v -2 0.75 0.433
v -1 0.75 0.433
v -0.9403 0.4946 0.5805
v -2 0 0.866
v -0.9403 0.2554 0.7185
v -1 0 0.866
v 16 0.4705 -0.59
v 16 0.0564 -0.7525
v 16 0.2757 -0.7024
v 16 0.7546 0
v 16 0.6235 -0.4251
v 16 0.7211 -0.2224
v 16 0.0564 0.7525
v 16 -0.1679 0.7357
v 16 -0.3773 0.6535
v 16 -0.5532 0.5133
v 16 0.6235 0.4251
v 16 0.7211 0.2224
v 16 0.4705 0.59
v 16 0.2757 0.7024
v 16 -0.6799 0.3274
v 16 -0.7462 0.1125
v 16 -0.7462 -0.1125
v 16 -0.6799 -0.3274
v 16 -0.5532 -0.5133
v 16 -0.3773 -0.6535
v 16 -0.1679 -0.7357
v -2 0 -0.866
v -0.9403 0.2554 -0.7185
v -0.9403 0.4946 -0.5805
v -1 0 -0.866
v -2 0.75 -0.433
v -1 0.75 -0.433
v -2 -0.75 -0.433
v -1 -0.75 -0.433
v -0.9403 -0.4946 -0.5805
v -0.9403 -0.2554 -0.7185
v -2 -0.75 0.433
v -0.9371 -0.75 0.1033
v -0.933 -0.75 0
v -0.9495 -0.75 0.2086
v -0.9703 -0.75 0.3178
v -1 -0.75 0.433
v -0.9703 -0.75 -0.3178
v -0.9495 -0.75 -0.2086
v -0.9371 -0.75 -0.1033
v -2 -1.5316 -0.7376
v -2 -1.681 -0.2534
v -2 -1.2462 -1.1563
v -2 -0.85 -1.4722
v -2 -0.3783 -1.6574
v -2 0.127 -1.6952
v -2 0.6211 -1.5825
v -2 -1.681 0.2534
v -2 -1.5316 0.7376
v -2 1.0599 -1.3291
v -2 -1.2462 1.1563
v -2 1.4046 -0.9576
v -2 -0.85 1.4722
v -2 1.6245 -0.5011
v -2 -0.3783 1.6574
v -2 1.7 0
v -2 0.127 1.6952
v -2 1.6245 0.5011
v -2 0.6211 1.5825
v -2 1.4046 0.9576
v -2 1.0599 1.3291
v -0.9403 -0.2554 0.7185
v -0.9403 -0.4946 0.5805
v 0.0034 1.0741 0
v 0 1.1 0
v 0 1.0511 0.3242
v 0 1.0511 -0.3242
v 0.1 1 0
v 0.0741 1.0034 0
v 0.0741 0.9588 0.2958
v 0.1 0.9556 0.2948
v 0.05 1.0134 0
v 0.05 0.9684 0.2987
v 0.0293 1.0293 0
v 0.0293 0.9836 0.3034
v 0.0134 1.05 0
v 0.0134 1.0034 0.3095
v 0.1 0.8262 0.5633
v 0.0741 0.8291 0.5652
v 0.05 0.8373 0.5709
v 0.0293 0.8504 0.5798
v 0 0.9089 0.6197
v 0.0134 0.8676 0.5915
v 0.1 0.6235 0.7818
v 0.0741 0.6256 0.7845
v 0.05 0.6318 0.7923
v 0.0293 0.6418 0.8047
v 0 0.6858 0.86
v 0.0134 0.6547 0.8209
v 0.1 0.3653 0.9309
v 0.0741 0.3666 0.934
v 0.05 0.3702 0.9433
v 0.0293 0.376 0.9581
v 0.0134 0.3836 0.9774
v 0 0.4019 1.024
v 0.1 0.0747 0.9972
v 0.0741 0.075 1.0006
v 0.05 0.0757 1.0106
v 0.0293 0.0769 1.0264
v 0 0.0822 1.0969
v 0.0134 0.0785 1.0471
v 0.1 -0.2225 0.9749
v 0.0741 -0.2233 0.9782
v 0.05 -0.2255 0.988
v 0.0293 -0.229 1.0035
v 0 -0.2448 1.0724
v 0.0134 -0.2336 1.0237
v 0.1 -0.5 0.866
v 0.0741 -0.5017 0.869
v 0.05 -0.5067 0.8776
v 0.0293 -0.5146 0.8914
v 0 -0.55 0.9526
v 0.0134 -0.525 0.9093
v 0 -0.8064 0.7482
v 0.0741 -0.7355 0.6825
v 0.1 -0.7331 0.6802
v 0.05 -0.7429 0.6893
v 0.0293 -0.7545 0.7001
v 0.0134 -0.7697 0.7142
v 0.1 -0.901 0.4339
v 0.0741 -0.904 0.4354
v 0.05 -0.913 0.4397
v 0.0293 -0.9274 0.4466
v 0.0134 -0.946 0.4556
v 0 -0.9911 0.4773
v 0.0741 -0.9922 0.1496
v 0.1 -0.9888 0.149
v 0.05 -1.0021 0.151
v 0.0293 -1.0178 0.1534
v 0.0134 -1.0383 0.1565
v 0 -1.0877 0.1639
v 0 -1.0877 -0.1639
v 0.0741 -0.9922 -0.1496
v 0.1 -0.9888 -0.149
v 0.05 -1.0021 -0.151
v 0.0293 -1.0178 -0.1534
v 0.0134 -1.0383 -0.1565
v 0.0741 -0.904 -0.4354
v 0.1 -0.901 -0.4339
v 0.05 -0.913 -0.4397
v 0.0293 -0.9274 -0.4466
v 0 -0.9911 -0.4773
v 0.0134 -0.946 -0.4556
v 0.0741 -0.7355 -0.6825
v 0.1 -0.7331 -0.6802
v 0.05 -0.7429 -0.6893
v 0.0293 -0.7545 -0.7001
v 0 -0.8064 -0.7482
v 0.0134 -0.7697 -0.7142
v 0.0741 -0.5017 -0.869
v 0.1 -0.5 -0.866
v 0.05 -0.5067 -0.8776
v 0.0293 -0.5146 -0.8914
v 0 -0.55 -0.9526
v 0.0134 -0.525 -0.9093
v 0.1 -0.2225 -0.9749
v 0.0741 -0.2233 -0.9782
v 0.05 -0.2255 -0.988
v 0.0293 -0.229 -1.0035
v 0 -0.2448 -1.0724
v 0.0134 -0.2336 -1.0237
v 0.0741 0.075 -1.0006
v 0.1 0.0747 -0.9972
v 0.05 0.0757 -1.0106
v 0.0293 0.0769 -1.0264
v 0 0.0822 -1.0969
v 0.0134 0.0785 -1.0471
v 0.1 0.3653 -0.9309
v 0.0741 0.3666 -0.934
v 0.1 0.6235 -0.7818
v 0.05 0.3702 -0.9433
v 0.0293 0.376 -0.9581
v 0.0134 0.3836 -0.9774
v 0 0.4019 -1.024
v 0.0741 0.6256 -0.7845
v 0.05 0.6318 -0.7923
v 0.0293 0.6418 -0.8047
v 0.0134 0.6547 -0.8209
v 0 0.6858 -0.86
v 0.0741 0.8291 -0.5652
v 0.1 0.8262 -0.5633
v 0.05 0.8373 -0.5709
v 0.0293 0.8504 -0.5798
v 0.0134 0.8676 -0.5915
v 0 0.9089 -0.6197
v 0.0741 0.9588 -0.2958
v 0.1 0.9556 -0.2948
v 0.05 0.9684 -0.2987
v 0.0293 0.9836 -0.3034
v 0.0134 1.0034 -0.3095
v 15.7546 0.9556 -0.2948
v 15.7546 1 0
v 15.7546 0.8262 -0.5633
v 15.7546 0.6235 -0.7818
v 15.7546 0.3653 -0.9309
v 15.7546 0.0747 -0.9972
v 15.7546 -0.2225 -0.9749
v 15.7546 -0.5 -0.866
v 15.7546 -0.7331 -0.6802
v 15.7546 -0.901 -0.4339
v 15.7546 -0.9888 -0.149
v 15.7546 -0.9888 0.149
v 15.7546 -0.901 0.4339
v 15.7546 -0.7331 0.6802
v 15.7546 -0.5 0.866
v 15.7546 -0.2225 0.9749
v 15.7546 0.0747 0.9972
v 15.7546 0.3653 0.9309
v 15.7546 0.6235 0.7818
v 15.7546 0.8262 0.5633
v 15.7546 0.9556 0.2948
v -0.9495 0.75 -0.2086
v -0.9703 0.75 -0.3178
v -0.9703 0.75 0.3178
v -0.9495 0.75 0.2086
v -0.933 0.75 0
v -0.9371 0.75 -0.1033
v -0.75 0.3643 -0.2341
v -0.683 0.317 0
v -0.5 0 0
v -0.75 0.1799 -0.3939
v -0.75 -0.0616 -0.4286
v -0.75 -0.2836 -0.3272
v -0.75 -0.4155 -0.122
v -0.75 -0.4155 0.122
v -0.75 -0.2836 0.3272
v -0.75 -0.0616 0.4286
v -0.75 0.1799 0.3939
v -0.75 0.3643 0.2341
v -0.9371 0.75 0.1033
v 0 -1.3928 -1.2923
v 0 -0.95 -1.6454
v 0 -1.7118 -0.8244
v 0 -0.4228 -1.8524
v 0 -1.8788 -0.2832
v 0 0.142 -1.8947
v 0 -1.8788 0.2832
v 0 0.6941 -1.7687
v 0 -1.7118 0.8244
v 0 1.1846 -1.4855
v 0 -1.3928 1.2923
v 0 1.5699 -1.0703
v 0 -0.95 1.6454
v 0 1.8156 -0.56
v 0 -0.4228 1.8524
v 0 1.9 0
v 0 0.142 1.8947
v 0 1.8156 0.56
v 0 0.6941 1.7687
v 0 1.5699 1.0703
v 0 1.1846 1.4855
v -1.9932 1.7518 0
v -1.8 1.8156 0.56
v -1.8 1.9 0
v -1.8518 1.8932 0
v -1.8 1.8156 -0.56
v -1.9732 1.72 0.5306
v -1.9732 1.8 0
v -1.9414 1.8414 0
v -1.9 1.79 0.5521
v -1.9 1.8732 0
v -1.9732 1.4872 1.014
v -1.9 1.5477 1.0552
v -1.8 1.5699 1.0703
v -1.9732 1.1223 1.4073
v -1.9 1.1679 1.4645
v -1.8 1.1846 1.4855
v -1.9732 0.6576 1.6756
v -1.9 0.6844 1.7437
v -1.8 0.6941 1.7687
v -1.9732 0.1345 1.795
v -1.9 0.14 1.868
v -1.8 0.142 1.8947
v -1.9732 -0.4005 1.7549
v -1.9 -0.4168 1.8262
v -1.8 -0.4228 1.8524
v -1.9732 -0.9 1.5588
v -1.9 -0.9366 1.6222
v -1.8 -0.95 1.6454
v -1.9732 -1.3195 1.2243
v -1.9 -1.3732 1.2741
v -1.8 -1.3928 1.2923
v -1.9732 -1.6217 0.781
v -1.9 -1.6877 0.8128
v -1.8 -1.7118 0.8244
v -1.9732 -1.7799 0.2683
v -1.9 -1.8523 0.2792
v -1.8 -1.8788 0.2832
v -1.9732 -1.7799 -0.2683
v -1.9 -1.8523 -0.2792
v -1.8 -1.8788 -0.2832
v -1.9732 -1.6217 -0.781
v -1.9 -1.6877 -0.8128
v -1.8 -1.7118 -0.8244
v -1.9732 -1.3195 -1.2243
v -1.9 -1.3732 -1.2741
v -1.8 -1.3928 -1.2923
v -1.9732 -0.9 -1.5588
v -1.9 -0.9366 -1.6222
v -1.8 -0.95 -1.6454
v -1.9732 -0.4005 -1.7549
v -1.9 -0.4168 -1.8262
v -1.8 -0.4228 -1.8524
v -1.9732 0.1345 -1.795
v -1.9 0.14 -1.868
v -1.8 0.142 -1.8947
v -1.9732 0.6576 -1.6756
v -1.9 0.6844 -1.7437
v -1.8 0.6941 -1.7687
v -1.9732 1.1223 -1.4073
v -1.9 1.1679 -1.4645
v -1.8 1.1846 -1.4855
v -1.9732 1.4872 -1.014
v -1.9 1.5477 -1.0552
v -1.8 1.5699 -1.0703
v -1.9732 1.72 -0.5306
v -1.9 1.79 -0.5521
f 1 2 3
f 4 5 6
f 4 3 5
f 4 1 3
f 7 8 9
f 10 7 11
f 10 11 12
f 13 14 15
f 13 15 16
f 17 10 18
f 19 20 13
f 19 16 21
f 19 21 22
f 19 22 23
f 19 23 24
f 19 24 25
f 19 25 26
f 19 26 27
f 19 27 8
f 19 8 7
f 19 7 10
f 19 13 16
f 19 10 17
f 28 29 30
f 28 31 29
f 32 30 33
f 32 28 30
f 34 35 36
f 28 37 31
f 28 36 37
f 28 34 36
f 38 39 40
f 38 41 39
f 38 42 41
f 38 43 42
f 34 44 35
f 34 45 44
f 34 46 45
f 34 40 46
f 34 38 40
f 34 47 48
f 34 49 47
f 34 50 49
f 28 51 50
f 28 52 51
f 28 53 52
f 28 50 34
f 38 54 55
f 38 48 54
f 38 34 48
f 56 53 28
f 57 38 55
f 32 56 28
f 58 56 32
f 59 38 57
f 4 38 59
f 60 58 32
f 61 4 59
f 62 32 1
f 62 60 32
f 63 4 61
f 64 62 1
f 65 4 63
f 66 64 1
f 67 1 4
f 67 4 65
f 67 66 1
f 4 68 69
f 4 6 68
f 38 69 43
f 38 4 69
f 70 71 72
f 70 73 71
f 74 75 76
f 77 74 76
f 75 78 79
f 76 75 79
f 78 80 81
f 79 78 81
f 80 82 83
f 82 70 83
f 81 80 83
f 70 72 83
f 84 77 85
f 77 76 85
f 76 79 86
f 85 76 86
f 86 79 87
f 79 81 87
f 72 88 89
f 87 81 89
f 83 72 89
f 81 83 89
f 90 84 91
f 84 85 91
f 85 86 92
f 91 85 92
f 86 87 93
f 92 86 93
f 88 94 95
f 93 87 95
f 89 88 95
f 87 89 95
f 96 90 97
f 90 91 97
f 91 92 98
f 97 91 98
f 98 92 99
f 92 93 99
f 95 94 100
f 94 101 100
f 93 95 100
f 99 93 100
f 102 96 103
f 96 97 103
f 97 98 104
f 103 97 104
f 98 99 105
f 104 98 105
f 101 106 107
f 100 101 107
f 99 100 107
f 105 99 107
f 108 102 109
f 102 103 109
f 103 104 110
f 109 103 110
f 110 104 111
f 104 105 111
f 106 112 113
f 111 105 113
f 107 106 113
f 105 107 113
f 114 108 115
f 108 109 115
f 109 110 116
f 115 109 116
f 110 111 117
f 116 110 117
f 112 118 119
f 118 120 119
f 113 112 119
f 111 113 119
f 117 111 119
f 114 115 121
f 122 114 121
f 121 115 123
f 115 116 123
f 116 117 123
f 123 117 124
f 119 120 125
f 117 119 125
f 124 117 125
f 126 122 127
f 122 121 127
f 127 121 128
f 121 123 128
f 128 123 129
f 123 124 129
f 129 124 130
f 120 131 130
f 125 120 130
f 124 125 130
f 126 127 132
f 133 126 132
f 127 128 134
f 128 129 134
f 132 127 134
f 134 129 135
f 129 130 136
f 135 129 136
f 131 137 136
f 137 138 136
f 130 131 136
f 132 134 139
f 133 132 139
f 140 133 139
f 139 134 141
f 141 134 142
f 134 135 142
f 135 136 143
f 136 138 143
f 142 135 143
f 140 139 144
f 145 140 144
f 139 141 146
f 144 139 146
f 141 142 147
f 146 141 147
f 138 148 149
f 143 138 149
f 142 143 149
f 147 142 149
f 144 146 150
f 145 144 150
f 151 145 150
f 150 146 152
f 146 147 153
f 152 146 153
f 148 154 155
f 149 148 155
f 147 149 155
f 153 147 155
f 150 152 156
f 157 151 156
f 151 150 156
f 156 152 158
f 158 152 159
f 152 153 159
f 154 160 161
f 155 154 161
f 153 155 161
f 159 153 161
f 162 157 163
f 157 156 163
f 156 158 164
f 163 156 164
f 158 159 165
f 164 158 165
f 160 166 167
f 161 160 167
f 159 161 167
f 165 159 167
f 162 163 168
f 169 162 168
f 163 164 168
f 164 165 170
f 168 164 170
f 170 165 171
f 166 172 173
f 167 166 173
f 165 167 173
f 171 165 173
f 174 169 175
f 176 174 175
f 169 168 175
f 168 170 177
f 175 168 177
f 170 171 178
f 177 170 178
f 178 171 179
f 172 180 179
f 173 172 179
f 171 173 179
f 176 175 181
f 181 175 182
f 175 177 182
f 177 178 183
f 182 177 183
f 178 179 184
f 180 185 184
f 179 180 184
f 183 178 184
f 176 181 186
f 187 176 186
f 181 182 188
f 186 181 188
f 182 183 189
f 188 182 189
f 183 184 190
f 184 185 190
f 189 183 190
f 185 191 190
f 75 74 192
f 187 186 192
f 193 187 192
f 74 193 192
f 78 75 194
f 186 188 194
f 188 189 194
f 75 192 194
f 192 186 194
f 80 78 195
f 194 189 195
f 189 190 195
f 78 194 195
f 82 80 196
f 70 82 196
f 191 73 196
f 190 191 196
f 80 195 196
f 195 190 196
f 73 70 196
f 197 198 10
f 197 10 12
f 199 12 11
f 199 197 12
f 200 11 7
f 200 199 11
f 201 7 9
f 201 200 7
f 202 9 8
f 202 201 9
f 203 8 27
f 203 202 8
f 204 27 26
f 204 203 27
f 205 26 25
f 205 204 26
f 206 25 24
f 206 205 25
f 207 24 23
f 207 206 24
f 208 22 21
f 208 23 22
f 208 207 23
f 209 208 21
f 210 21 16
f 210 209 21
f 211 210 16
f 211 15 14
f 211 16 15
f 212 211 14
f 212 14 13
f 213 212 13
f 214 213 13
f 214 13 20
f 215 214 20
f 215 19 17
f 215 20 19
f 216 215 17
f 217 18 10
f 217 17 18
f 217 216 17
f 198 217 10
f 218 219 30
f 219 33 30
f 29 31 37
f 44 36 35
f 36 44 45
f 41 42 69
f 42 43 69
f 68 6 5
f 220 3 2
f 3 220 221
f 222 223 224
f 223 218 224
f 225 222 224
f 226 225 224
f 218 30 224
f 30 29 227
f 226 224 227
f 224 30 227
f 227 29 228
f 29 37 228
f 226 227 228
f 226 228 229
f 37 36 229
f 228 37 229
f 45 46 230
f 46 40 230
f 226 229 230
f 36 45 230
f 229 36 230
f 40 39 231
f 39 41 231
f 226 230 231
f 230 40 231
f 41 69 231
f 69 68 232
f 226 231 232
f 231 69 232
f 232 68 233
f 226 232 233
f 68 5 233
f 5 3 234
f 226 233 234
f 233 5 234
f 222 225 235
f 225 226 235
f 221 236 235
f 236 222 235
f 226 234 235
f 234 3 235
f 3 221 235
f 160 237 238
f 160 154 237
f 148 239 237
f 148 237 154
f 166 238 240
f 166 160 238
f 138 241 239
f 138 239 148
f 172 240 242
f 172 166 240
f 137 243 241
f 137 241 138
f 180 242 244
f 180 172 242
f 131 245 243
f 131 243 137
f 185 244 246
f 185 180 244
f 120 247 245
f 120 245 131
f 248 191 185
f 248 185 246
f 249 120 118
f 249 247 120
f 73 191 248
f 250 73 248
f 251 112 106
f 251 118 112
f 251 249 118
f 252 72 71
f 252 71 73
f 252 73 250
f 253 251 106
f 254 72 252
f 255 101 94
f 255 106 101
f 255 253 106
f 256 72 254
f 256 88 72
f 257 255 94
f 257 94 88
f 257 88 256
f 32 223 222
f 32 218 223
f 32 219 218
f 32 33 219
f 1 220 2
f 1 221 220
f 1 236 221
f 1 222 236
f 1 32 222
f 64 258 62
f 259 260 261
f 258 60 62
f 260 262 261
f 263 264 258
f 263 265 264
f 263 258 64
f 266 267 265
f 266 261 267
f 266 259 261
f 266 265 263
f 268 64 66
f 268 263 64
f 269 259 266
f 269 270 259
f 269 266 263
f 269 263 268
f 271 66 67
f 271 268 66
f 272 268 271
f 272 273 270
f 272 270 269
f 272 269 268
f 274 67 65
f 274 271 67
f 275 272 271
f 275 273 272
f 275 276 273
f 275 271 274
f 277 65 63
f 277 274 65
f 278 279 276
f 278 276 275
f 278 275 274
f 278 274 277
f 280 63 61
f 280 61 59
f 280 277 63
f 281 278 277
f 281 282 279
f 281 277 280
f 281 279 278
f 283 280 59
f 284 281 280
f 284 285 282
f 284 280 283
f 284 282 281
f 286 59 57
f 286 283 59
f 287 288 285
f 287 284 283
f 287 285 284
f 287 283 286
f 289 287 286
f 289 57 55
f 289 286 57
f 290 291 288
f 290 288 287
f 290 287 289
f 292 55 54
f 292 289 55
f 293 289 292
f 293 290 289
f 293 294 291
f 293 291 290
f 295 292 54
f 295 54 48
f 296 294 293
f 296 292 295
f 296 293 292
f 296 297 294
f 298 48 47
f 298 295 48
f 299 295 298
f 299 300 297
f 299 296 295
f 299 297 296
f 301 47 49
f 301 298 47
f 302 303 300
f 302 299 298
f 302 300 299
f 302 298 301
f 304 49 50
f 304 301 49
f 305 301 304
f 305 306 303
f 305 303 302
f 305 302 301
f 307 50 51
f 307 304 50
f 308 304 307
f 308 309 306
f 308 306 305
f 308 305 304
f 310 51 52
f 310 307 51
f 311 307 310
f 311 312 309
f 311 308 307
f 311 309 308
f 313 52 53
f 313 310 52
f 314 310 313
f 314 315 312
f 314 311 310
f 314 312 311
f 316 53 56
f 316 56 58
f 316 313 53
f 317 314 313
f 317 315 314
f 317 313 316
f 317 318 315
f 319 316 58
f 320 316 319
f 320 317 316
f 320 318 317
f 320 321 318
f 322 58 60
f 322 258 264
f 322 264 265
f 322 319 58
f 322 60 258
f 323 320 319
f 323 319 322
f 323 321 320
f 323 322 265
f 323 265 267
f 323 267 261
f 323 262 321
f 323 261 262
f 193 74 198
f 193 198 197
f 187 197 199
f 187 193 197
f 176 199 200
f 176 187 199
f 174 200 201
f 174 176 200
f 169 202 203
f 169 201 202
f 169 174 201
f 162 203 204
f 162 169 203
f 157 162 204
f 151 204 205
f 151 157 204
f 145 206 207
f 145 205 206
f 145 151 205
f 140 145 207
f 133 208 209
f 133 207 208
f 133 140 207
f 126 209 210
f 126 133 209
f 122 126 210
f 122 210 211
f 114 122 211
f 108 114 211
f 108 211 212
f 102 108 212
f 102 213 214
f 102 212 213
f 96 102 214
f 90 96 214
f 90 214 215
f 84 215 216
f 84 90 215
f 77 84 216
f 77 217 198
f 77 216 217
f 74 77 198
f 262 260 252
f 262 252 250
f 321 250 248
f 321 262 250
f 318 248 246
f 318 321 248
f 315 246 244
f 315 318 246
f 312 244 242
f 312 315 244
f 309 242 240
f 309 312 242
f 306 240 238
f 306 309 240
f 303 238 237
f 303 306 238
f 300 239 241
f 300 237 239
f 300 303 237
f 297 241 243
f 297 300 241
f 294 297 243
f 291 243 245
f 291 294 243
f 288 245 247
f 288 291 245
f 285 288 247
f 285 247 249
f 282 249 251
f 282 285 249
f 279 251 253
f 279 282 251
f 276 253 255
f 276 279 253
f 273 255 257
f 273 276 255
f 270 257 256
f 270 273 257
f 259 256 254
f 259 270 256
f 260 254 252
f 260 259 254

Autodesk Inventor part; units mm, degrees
ref_plane "YZ Plane" through (0, 0, 0) normal (1, 0, 0) x (0, 1, 0)
ref_plane "XZ Plane" through (0, 0, 0) normal (0, 1, 0) x (-1, 0, 0)
sketch "Sketch1" plane through (0, 0, 0) normal (0, 0, 1) x (1, 0, 0)
  line L0 (-0.5, 0) -> (16, 0)
  line L1 (16, 0) -> (16, 1)
  line L2 (16, 1) -> (1, 1)
  line L3 (1, 1) -> (0.7545, 1)
  line L4 (0.7545, 1) -> (0, 1)
  line L5 (0, 1) -> (0, 1.9)
  line L6 (0, 1.9) -> (-2, 1.9)
  line L7 (-2, 1.9) -> (-2, 0.866)
  line L8 (-2, 0.866) -> (-1, 0.866)
  line L9 (-1, 0.866) -> (-0.5, 0)
  line L10 (-5.6, 0) -> (19.6, 0) projected
  line L11 (0, -0.38) -> (0, 2.28) projected
  line L12 (1, 1) -> (0, 1) construction
  dimension "d1" = 15
  dimension "d2" = 0.2455
  dimension "d3" = 2
  dimension "d4" = 1
  dimension "d5" = 60
  dimension "d6" = 2
  dimension "d7" = 2
  dimension "d8" = 1.7321
  dimension "d9" = 3.8
  dimension "d26" = 16
revolve "Body" add sketch "Sketch1" angle 360 about axis through (-0.5, 0, 0) along (1, 0, 0)
sketch "Sketch2" plane through (-2, 0, 0) normal (-1, 0, 0) x (0, 0, 1)
  circle A0 centre (0, 0) radius 0.866 projected
  line L0 (0, -2.66) -> (0, 2.66) projected
  line L1 (-2.66, 0) -> (2.66, 0) projected
  line L2 (0.866, 0) -> (0.433, -0.75)
  line L3 (0.433, -0.75) -> (-0.433, -0.75)
  line L4 (-0.433, -0.75) -> (-0.866, 0)
  line L5 (-0.866, 0) -> (-0.433, 0.75)
  line L6 (-0.433, 0.75) -> (0.433, 0.75)
  line L7 (0.433, 0.75) -> (0.866, 0)
  point P0 (0, 0)
extrude "Slot" add sketch "Sketch2" against normal up to next contours L7 A0 | A0 L2 | L6 L0 A0 | A0 L0 L3 | L0 L6 A0 | A0 L3 L0 | L4 A0 | A0 L5
fillet "Fillet1" radius 0.2 1 edges at (-2, -1.9, 0)
thread "Thread" size "M2x0.4" designation "M2" class "6g" standard "ISO Metric profile" length 15
chamfer "Chamfer1" distance 0.2454 distance2 0.2454 1 edges at (16, -1, 0) measured on face at (16, -0.5786, -0.2558)
ref_plane "Work Plane1" through (29, 0, 0) normal (0, -1, 0) x (1, 0, 0)
fillet "Fillet2" radius 0.1 1 edges at (0, -1, 0)
equation "\"d1\" = GEL"
equation "\"d3\" = KOH"
equation "\"d4\" = INTI"
equation "\"d6\" = GD"
equation "\"d7\" = BDM"
equation "\"d8\" = 1.1547 * SW"
equation "\"d9\" = KOD"
equation "\"d26\" = NLG"
equation "\"d30\" = R"
equation "\"d17\" = RR"
equation "\"d13\" = GEL"
equation "\"d15\" = -0.5 * SPD + 0.5 * GD"
equation "\"d16\" = GUL"
equation "\"GD\" = 2"
equation "\"NLG\" = 16"
equation "\"GEL\" = 15"
equation "\"KOD\" = 3.8"
equation "\"KOH\" = 2"
equation "\"INTI\" = 1"
equation "\"GAL\" = 0.61345 * PTC"
equation "\"GUL\" = 0.61345 * PTC"
equation "\"BDM\" = NND"
equation "\"SW\" = 1.5"
equation "\"RR\" = 0.2"
equation "\"SPD\" = NND - 1.2269 * PTC"
equation "\"R\" = 0.1"
equation "\"TOA\" = 30deg"
equation "\"GD1\" = THREADDIA - 1.2269 * PTC"
equation "\"THREADDIA\" = 2"
equation "\"FAWI\" = 45deg"
equation "\"PTC\" = 0.4"
equation "\"NND\" = 2"
equation "\"E0\" = 1.155 * SW"
properties part number "ISO 4762 - M2 x 16" material "Steel"
